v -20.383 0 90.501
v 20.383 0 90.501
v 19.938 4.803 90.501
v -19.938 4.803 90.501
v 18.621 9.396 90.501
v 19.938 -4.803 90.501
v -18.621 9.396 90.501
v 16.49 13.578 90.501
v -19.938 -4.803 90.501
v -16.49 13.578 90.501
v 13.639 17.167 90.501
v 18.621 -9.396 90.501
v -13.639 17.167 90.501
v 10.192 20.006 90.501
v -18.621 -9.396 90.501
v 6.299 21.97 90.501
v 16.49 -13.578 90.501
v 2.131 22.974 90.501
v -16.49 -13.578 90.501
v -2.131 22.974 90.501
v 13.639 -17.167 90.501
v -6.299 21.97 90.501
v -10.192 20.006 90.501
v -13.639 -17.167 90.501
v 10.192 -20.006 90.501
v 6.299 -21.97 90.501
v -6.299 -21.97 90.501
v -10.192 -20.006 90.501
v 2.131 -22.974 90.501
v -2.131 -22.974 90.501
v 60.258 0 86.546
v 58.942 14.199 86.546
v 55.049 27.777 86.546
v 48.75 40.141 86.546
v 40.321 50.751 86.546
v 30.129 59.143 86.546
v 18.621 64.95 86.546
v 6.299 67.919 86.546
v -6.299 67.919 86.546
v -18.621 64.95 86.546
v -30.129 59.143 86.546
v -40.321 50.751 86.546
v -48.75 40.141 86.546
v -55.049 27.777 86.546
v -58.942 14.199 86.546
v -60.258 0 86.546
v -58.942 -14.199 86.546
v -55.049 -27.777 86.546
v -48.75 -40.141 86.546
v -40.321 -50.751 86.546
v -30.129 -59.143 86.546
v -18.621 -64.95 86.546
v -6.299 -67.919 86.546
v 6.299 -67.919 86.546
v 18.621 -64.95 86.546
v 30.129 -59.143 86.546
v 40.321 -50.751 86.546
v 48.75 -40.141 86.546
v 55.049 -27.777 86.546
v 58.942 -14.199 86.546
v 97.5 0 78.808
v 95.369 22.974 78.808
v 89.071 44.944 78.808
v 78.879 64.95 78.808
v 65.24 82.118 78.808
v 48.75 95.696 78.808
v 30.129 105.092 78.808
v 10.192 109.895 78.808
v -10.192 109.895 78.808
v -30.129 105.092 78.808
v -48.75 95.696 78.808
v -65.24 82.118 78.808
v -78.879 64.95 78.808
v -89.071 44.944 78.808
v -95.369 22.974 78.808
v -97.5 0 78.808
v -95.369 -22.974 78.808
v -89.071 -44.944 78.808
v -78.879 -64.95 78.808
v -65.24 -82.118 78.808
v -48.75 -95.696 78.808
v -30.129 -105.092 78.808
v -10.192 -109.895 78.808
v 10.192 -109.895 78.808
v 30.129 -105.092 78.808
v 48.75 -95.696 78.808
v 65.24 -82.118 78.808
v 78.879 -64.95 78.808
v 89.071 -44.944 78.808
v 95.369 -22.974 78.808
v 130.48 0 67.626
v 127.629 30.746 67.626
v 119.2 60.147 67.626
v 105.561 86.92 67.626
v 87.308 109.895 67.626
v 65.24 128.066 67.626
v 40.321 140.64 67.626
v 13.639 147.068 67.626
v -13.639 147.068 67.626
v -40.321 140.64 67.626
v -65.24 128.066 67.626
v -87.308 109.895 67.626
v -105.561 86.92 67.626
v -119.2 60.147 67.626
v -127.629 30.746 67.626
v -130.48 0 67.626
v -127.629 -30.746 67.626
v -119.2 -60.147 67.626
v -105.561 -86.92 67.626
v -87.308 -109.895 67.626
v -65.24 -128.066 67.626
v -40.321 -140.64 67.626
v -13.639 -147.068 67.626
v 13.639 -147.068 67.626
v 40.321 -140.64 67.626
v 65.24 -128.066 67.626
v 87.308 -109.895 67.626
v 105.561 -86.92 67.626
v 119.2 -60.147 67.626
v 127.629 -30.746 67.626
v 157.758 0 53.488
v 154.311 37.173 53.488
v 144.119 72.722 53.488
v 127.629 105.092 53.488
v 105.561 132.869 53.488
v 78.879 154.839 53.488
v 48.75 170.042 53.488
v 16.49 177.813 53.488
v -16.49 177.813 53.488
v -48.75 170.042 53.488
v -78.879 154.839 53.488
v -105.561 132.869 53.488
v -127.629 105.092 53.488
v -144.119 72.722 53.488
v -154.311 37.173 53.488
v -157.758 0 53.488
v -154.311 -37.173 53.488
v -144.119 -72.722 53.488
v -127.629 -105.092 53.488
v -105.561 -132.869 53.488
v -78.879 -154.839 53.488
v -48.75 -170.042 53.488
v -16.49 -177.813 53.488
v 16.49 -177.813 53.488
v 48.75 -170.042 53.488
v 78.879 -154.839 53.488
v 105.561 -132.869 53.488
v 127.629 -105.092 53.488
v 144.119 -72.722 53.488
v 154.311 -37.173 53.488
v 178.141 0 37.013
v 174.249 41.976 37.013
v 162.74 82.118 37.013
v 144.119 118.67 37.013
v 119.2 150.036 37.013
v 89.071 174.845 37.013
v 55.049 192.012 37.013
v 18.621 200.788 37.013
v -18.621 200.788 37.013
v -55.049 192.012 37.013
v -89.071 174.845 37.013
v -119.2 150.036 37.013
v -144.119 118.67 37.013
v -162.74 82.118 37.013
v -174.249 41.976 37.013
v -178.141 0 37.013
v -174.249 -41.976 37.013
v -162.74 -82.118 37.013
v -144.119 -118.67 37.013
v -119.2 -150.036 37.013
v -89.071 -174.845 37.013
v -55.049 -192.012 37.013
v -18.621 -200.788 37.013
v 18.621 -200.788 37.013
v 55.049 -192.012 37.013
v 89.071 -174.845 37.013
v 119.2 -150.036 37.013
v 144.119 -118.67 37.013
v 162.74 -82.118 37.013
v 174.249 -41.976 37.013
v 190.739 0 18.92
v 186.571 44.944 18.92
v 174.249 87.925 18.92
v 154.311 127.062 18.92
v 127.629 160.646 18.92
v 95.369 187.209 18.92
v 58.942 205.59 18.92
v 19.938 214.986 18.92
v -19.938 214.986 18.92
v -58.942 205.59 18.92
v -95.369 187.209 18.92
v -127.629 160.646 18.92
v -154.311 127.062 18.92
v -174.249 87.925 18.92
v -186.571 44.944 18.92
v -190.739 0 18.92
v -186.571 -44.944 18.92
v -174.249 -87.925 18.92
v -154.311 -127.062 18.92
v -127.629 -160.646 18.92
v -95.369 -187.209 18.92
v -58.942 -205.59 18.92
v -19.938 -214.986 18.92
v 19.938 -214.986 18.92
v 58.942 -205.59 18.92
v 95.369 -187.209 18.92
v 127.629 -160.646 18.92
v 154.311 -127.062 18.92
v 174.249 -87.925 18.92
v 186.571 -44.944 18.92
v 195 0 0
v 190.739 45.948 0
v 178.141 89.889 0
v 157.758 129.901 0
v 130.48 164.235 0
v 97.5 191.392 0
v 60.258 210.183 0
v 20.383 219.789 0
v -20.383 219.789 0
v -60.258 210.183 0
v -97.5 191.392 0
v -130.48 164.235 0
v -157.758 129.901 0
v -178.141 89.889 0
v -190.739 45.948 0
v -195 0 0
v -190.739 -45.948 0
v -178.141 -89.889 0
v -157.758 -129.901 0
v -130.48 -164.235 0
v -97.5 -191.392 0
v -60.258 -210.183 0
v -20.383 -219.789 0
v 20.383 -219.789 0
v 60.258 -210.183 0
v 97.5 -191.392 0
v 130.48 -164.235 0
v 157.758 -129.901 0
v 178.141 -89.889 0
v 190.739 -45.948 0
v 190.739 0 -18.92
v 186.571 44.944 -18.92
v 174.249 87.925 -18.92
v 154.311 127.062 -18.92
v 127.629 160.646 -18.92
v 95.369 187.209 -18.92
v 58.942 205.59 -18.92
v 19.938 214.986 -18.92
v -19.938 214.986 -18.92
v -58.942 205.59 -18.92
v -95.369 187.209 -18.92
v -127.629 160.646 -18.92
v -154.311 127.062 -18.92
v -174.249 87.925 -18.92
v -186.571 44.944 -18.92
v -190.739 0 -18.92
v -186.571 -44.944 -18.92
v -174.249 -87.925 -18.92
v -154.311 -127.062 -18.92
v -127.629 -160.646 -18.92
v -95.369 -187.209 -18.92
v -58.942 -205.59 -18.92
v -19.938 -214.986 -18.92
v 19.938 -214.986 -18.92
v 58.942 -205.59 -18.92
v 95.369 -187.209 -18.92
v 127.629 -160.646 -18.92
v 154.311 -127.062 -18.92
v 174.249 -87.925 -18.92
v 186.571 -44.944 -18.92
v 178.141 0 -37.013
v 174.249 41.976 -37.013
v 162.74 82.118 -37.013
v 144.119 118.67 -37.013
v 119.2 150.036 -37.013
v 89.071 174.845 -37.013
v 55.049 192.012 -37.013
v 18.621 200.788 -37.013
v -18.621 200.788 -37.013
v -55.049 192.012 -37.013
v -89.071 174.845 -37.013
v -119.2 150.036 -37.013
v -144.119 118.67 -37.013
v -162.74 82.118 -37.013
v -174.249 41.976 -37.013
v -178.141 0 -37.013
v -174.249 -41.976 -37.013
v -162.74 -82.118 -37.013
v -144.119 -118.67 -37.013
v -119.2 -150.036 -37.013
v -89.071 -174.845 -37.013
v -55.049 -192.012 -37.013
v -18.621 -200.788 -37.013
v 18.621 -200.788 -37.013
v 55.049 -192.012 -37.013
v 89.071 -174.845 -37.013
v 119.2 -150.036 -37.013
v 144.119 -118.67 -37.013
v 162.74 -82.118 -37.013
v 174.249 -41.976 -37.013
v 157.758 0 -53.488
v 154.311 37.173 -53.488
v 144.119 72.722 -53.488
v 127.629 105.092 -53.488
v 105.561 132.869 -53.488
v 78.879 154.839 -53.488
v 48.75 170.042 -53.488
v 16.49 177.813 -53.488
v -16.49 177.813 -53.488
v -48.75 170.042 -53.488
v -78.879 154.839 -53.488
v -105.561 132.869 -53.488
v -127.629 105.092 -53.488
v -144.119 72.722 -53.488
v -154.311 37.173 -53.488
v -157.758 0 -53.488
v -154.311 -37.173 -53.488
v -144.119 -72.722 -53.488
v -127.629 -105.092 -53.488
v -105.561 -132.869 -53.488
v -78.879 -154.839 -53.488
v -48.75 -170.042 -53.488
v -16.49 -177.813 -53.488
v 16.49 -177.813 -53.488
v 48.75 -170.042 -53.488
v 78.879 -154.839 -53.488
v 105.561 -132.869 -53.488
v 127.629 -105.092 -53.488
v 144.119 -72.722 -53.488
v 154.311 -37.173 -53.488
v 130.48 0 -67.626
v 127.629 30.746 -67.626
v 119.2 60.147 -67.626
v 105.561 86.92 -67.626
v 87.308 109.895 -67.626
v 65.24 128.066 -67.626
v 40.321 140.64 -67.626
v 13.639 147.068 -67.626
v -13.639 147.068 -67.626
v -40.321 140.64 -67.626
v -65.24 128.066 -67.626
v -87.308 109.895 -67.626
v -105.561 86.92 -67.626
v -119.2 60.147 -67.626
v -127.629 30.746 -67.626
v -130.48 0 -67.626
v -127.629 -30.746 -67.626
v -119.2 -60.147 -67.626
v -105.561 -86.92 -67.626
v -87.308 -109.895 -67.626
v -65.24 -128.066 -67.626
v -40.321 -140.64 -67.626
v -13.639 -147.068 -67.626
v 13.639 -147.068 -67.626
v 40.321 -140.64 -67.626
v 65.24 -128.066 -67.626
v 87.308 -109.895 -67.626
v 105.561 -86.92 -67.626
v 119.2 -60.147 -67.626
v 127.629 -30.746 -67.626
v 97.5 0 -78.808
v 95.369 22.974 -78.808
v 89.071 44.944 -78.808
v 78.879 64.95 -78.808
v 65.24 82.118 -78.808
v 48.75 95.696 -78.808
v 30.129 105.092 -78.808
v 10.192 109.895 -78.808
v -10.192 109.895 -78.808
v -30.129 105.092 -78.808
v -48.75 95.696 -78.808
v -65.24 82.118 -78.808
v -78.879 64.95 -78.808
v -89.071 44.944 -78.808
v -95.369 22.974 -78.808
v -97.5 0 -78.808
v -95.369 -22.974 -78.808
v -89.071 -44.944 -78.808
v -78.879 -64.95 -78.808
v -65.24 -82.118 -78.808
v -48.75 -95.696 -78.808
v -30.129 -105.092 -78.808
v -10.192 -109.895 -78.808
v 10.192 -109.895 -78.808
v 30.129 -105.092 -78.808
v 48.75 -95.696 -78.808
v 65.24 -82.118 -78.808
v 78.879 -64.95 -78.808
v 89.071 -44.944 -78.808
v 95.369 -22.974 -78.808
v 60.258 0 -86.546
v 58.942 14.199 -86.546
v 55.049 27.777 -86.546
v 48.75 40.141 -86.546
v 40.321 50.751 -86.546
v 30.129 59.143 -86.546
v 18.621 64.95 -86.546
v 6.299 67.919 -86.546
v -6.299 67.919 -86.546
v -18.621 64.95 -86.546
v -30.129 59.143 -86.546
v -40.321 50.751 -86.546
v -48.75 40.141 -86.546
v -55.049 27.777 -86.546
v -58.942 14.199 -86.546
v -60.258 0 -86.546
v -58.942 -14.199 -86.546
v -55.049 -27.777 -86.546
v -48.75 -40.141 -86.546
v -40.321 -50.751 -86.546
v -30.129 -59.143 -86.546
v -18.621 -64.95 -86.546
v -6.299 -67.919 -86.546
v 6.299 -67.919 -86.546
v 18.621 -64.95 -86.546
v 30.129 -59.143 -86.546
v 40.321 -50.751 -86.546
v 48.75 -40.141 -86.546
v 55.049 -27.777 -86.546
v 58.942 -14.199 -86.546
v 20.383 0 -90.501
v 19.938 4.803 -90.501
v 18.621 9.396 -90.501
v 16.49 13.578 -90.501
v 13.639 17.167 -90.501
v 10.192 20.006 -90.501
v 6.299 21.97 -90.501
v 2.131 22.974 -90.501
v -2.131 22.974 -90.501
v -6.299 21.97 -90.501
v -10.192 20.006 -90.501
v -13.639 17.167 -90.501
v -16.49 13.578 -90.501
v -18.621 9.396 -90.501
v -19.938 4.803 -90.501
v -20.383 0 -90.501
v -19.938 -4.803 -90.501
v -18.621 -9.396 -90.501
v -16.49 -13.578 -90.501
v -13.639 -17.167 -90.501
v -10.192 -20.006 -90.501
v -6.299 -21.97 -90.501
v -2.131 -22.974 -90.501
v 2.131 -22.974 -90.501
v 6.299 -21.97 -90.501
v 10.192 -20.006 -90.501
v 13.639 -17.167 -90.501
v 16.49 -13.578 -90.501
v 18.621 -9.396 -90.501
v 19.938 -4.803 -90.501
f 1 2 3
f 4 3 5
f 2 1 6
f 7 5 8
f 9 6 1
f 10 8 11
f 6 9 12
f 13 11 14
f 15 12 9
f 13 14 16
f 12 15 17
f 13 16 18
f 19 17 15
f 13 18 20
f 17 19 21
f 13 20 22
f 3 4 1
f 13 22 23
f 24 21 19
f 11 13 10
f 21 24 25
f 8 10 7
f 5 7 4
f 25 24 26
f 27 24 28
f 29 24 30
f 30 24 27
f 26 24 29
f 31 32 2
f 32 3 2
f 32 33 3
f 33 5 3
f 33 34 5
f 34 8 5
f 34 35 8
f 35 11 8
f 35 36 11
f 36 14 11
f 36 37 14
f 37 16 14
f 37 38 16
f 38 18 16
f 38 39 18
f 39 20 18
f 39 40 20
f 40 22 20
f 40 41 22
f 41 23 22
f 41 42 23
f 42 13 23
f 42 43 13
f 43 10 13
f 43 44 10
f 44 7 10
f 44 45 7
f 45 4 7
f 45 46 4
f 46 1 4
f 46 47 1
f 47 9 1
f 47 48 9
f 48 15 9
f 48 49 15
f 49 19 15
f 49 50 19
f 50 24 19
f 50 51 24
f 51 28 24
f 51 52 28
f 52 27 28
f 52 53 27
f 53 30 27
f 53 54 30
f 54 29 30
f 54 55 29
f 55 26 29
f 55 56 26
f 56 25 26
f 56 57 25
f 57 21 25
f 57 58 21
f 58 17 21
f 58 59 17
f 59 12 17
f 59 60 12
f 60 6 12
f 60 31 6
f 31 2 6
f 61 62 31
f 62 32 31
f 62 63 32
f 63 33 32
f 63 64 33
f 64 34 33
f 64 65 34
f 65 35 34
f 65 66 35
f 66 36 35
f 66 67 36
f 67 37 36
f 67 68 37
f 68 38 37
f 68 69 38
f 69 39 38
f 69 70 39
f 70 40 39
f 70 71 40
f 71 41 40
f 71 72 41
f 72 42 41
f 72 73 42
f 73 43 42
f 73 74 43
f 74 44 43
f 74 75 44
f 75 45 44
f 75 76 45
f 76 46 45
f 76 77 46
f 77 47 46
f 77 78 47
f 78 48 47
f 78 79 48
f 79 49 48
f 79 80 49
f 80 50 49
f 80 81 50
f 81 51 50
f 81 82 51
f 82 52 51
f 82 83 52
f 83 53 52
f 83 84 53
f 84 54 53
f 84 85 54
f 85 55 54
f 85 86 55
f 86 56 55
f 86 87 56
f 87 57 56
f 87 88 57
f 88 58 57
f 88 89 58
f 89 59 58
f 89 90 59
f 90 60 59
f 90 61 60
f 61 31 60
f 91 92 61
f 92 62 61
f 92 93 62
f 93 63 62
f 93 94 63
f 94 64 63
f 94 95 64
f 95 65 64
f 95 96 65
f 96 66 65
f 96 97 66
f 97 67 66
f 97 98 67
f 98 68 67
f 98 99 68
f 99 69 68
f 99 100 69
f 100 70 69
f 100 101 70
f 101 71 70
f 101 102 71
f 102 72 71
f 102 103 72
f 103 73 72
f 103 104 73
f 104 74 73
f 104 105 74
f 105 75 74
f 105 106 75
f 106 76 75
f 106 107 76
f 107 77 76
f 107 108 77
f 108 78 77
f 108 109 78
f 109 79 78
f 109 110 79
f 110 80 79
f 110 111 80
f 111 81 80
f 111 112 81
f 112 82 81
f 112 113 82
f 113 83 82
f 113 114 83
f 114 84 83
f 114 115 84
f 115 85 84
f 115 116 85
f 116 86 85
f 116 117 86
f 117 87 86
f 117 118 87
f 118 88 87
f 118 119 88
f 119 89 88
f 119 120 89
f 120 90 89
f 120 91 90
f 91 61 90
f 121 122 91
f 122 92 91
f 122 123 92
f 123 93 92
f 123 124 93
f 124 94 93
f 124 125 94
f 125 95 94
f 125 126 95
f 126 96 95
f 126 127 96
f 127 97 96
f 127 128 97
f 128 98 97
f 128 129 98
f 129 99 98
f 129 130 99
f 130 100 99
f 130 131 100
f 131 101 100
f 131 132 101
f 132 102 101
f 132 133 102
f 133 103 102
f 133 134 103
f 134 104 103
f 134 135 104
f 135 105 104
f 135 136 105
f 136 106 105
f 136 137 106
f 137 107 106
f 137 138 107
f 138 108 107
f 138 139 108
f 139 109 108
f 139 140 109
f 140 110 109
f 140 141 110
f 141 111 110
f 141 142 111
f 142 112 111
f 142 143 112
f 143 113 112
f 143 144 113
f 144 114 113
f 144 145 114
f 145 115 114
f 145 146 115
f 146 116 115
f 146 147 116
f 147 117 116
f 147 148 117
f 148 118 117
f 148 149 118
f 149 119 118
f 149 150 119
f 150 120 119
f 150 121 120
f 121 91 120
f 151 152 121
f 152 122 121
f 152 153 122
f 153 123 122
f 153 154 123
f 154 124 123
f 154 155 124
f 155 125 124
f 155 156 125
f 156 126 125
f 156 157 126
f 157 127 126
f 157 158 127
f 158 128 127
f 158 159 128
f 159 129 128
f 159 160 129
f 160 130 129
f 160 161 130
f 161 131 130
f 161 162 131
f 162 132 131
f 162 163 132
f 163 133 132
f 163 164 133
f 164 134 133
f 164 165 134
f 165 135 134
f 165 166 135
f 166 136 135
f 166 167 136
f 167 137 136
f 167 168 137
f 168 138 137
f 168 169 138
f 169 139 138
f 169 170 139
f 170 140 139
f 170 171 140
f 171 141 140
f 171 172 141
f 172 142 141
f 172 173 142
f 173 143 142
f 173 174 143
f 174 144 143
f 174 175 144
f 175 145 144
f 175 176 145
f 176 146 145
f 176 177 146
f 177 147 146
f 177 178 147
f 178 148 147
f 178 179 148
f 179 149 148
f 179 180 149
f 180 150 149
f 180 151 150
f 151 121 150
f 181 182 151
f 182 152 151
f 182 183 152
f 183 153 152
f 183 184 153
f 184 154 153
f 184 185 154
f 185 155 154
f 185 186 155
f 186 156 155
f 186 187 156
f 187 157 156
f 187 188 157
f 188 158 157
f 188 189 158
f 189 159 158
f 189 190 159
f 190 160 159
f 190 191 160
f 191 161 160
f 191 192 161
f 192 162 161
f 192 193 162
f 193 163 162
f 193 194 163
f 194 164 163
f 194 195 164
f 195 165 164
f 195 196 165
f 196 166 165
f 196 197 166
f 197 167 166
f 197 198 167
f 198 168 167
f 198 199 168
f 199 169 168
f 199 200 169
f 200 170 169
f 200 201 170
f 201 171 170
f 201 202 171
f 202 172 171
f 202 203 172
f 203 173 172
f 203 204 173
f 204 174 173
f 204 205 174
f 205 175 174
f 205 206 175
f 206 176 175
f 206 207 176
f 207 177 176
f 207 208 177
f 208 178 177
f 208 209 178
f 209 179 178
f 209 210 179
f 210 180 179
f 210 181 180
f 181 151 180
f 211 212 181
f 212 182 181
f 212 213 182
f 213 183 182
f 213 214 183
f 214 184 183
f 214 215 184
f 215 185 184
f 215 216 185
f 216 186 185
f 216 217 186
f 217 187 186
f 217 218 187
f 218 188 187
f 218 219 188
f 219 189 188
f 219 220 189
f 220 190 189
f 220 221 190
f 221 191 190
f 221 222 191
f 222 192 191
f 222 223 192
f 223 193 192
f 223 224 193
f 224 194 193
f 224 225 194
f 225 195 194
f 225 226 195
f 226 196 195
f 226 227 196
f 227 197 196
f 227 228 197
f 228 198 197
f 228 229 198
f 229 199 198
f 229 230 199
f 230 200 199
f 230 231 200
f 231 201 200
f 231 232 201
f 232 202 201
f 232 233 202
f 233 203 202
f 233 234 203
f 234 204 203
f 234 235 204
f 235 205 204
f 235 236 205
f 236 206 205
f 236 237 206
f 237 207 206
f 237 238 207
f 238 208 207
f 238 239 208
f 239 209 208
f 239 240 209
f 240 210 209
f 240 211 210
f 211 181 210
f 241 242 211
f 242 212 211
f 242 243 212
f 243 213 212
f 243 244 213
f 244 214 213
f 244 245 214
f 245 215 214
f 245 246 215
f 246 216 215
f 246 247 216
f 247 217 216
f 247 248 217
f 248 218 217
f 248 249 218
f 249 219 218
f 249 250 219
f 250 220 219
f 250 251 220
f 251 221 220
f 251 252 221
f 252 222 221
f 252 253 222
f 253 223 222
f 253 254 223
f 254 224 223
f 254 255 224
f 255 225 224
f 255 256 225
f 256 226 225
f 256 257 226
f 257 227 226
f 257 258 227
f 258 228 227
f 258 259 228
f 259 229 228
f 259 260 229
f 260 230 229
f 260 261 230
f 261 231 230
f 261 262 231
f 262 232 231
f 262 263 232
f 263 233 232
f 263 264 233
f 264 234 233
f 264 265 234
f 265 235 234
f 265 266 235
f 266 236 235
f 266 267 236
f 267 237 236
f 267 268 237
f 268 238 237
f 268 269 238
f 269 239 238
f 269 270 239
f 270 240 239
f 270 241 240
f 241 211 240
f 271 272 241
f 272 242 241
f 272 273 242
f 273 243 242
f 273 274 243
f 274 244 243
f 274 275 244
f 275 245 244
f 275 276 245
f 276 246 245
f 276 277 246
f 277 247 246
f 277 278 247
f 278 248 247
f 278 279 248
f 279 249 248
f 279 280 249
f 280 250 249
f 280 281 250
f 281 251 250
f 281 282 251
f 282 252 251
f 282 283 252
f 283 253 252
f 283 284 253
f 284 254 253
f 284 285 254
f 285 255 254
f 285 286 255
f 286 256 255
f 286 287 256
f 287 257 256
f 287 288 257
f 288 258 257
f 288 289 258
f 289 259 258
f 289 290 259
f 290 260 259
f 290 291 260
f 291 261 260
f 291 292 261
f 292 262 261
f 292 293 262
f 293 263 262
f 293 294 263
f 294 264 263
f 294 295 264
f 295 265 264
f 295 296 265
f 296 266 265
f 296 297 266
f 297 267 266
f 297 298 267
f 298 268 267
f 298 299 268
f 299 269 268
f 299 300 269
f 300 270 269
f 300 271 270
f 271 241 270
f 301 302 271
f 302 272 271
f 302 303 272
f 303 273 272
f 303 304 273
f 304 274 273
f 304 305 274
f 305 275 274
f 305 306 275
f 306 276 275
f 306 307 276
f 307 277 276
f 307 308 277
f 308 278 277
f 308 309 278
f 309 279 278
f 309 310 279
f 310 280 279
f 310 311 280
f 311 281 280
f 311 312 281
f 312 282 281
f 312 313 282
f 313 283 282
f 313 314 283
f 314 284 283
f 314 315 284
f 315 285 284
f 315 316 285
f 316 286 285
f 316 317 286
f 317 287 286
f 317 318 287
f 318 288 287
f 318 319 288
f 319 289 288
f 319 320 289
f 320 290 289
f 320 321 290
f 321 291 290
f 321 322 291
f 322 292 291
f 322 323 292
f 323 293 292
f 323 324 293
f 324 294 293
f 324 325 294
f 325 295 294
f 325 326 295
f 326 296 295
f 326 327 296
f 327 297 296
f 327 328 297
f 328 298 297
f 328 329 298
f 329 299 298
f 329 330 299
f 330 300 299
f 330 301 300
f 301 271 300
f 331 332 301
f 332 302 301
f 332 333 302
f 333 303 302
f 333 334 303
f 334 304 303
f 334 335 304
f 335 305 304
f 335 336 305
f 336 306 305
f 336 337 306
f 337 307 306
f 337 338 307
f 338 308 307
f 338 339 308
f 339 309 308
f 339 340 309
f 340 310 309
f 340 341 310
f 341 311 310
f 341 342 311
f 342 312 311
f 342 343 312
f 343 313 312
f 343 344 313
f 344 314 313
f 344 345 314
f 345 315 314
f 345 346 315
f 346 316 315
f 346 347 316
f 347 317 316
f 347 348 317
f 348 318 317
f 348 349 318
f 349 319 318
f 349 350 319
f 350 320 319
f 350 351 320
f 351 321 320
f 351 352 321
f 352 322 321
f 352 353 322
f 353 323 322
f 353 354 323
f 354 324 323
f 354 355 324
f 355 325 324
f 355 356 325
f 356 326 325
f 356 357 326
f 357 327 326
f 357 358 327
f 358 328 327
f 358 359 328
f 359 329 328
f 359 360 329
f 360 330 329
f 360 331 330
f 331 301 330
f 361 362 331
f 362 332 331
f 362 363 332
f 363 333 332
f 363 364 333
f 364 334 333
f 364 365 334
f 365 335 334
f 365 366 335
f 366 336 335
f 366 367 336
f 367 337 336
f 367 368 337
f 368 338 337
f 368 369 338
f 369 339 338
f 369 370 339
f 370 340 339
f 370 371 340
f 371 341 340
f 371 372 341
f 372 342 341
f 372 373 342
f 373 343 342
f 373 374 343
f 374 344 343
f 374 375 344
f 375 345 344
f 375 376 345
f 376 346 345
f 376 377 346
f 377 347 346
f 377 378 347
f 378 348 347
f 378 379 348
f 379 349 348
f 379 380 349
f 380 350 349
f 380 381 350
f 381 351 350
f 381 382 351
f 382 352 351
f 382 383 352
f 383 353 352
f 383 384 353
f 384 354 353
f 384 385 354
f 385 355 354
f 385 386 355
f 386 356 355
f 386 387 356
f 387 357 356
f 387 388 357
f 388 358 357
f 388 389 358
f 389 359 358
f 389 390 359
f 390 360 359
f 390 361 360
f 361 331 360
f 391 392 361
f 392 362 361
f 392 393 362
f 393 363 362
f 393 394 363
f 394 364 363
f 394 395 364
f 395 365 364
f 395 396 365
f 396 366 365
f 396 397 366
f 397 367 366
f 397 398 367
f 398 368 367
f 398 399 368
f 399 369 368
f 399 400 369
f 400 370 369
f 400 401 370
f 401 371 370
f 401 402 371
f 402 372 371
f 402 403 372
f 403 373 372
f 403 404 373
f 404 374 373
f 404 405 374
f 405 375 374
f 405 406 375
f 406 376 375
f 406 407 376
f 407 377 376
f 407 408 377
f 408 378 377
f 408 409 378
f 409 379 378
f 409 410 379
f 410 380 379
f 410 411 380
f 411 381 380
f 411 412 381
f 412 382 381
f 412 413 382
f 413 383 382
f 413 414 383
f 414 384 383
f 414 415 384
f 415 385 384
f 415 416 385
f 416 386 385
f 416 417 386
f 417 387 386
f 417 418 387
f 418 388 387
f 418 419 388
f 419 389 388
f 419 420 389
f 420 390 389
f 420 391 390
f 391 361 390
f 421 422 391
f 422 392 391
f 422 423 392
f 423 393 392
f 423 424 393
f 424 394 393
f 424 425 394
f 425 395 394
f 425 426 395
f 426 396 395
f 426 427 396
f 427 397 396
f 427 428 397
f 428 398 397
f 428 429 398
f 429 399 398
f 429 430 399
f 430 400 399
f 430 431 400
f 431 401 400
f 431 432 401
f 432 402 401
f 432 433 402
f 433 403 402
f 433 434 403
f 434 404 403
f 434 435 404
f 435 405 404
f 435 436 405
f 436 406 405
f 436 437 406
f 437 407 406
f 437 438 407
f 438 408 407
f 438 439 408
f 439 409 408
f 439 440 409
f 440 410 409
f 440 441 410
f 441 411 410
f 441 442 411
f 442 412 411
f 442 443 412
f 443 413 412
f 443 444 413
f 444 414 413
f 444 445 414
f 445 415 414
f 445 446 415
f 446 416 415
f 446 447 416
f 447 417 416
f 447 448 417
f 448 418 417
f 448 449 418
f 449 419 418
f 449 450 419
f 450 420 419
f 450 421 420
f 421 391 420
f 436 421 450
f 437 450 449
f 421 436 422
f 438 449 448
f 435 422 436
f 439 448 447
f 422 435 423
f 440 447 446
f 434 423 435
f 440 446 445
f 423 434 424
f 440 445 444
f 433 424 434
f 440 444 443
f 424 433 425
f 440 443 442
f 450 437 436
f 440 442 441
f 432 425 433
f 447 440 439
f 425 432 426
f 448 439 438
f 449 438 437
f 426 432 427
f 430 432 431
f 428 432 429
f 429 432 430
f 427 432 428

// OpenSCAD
// Generated by SolidPython 1.0.1 on 2020-07-29 00:46:52


scale(v = [15, 17, 7]) {
	sphere(r = 13);
}
/***********************************************
*********      SolidPython code:      **********
************************************************
 
# import packages: SolidPython
from solid import *
from solid.utils import *
from itertools import chain, combinations, permutations


class Resize:

    def __init__(self, scad_file):
        self.scad_file = scad_file
        #self.scad_file = import_scad(scad_file)
        # cone/cylinder param:
        self.r1 = 0
        self.r2 = 0
        self.h = 0
        # rectangular prism param:
        self.w = 0
        self.l = 0
        # ellipse param:
        self.r = 0

    # import OpenScad code (file name corresponds to shape)


    # classify shape + parameters
    def assign(self, param1, param2, param3):
        if self.scad_file == 'cone.scad':
            self.r1 = param1
            self.r2 = param2
            self.h = param3
        elif self.scad_file == 'cylinder.scad':
            self.r1 = param1
            self.r2 = param2
            self.h = param3
        elif self.scad_file == 'rectangularPrism.scad':
            self.h = param1
            self.l = param2
            self.w = param3
        else:
            self.r = param1
            self.h = param2

    # resize parameters
    def iterate(self):
        x = range(3, 20, 2)
        i = 1
        if self.scad_file == 'cone.scad':
            tempList = list(permutations(x, 2))
            for temp in tempList:
                param1 = temp[0]
                param2 = temp[1]
                filepath = 'produced_scad_files/' + 'cone' + str(param1) + '_' + str(param2) + '_' + '.scad'
                scad_render_to_file(cylinder(h=param1, r1=param2, r2=0), filepath)

        elif self.scad_file == 'cylinder.scad':
            tempList = list(permutations(x, 3))
            for temp in tempList:
                param1 = temp[0]
                param2 = temp[1]
                filepath = 'produced_scad_files/' + 'cylinder' + str(param1) + '_' + str(param2) + '_' + '.scad'
                scad_render_to_file(cylinder(h=param1, r1=param2, r2=param2), filepath)

        elif self.scad_file == 'rectangularPrism.scad':
            tempList = list(permutations(x, 3))
            for temp in tempList:
                param1 = temp[0]
                param2 = temp[1]
                param3 = temp[2]
                filepath = 'produced_scad_files/' + 'rectangularPrism' + str(param1) + '_' + str(param2) + '_' + str(
                    param3) + '.scad'
                scad_render_to_file(cube(size=(param1, param2, param3)), filepath)

        elif self.scad_file == 'ellipse.scad':
            tempList = list(permutations(x, 4))
            for temp in tempList:
                param1 = temp[0]
                param2 = temp[1]
                param3 = temp[2]
                param4 = temp[3]
                filepath = 'produced_scad_files/' + 'ellipse' + str(param1) + '_' + str(param2) + '_' + str(param3) + '_' + str(param4) + '.scad'
                scad_render_to_file(scale([param1, param2, param3])(sphere(r=param4)), filepath)

    def render_to_scadfile(self):
        scad_render_to_file(scad, 'example.scad') 
 
************************************************/
